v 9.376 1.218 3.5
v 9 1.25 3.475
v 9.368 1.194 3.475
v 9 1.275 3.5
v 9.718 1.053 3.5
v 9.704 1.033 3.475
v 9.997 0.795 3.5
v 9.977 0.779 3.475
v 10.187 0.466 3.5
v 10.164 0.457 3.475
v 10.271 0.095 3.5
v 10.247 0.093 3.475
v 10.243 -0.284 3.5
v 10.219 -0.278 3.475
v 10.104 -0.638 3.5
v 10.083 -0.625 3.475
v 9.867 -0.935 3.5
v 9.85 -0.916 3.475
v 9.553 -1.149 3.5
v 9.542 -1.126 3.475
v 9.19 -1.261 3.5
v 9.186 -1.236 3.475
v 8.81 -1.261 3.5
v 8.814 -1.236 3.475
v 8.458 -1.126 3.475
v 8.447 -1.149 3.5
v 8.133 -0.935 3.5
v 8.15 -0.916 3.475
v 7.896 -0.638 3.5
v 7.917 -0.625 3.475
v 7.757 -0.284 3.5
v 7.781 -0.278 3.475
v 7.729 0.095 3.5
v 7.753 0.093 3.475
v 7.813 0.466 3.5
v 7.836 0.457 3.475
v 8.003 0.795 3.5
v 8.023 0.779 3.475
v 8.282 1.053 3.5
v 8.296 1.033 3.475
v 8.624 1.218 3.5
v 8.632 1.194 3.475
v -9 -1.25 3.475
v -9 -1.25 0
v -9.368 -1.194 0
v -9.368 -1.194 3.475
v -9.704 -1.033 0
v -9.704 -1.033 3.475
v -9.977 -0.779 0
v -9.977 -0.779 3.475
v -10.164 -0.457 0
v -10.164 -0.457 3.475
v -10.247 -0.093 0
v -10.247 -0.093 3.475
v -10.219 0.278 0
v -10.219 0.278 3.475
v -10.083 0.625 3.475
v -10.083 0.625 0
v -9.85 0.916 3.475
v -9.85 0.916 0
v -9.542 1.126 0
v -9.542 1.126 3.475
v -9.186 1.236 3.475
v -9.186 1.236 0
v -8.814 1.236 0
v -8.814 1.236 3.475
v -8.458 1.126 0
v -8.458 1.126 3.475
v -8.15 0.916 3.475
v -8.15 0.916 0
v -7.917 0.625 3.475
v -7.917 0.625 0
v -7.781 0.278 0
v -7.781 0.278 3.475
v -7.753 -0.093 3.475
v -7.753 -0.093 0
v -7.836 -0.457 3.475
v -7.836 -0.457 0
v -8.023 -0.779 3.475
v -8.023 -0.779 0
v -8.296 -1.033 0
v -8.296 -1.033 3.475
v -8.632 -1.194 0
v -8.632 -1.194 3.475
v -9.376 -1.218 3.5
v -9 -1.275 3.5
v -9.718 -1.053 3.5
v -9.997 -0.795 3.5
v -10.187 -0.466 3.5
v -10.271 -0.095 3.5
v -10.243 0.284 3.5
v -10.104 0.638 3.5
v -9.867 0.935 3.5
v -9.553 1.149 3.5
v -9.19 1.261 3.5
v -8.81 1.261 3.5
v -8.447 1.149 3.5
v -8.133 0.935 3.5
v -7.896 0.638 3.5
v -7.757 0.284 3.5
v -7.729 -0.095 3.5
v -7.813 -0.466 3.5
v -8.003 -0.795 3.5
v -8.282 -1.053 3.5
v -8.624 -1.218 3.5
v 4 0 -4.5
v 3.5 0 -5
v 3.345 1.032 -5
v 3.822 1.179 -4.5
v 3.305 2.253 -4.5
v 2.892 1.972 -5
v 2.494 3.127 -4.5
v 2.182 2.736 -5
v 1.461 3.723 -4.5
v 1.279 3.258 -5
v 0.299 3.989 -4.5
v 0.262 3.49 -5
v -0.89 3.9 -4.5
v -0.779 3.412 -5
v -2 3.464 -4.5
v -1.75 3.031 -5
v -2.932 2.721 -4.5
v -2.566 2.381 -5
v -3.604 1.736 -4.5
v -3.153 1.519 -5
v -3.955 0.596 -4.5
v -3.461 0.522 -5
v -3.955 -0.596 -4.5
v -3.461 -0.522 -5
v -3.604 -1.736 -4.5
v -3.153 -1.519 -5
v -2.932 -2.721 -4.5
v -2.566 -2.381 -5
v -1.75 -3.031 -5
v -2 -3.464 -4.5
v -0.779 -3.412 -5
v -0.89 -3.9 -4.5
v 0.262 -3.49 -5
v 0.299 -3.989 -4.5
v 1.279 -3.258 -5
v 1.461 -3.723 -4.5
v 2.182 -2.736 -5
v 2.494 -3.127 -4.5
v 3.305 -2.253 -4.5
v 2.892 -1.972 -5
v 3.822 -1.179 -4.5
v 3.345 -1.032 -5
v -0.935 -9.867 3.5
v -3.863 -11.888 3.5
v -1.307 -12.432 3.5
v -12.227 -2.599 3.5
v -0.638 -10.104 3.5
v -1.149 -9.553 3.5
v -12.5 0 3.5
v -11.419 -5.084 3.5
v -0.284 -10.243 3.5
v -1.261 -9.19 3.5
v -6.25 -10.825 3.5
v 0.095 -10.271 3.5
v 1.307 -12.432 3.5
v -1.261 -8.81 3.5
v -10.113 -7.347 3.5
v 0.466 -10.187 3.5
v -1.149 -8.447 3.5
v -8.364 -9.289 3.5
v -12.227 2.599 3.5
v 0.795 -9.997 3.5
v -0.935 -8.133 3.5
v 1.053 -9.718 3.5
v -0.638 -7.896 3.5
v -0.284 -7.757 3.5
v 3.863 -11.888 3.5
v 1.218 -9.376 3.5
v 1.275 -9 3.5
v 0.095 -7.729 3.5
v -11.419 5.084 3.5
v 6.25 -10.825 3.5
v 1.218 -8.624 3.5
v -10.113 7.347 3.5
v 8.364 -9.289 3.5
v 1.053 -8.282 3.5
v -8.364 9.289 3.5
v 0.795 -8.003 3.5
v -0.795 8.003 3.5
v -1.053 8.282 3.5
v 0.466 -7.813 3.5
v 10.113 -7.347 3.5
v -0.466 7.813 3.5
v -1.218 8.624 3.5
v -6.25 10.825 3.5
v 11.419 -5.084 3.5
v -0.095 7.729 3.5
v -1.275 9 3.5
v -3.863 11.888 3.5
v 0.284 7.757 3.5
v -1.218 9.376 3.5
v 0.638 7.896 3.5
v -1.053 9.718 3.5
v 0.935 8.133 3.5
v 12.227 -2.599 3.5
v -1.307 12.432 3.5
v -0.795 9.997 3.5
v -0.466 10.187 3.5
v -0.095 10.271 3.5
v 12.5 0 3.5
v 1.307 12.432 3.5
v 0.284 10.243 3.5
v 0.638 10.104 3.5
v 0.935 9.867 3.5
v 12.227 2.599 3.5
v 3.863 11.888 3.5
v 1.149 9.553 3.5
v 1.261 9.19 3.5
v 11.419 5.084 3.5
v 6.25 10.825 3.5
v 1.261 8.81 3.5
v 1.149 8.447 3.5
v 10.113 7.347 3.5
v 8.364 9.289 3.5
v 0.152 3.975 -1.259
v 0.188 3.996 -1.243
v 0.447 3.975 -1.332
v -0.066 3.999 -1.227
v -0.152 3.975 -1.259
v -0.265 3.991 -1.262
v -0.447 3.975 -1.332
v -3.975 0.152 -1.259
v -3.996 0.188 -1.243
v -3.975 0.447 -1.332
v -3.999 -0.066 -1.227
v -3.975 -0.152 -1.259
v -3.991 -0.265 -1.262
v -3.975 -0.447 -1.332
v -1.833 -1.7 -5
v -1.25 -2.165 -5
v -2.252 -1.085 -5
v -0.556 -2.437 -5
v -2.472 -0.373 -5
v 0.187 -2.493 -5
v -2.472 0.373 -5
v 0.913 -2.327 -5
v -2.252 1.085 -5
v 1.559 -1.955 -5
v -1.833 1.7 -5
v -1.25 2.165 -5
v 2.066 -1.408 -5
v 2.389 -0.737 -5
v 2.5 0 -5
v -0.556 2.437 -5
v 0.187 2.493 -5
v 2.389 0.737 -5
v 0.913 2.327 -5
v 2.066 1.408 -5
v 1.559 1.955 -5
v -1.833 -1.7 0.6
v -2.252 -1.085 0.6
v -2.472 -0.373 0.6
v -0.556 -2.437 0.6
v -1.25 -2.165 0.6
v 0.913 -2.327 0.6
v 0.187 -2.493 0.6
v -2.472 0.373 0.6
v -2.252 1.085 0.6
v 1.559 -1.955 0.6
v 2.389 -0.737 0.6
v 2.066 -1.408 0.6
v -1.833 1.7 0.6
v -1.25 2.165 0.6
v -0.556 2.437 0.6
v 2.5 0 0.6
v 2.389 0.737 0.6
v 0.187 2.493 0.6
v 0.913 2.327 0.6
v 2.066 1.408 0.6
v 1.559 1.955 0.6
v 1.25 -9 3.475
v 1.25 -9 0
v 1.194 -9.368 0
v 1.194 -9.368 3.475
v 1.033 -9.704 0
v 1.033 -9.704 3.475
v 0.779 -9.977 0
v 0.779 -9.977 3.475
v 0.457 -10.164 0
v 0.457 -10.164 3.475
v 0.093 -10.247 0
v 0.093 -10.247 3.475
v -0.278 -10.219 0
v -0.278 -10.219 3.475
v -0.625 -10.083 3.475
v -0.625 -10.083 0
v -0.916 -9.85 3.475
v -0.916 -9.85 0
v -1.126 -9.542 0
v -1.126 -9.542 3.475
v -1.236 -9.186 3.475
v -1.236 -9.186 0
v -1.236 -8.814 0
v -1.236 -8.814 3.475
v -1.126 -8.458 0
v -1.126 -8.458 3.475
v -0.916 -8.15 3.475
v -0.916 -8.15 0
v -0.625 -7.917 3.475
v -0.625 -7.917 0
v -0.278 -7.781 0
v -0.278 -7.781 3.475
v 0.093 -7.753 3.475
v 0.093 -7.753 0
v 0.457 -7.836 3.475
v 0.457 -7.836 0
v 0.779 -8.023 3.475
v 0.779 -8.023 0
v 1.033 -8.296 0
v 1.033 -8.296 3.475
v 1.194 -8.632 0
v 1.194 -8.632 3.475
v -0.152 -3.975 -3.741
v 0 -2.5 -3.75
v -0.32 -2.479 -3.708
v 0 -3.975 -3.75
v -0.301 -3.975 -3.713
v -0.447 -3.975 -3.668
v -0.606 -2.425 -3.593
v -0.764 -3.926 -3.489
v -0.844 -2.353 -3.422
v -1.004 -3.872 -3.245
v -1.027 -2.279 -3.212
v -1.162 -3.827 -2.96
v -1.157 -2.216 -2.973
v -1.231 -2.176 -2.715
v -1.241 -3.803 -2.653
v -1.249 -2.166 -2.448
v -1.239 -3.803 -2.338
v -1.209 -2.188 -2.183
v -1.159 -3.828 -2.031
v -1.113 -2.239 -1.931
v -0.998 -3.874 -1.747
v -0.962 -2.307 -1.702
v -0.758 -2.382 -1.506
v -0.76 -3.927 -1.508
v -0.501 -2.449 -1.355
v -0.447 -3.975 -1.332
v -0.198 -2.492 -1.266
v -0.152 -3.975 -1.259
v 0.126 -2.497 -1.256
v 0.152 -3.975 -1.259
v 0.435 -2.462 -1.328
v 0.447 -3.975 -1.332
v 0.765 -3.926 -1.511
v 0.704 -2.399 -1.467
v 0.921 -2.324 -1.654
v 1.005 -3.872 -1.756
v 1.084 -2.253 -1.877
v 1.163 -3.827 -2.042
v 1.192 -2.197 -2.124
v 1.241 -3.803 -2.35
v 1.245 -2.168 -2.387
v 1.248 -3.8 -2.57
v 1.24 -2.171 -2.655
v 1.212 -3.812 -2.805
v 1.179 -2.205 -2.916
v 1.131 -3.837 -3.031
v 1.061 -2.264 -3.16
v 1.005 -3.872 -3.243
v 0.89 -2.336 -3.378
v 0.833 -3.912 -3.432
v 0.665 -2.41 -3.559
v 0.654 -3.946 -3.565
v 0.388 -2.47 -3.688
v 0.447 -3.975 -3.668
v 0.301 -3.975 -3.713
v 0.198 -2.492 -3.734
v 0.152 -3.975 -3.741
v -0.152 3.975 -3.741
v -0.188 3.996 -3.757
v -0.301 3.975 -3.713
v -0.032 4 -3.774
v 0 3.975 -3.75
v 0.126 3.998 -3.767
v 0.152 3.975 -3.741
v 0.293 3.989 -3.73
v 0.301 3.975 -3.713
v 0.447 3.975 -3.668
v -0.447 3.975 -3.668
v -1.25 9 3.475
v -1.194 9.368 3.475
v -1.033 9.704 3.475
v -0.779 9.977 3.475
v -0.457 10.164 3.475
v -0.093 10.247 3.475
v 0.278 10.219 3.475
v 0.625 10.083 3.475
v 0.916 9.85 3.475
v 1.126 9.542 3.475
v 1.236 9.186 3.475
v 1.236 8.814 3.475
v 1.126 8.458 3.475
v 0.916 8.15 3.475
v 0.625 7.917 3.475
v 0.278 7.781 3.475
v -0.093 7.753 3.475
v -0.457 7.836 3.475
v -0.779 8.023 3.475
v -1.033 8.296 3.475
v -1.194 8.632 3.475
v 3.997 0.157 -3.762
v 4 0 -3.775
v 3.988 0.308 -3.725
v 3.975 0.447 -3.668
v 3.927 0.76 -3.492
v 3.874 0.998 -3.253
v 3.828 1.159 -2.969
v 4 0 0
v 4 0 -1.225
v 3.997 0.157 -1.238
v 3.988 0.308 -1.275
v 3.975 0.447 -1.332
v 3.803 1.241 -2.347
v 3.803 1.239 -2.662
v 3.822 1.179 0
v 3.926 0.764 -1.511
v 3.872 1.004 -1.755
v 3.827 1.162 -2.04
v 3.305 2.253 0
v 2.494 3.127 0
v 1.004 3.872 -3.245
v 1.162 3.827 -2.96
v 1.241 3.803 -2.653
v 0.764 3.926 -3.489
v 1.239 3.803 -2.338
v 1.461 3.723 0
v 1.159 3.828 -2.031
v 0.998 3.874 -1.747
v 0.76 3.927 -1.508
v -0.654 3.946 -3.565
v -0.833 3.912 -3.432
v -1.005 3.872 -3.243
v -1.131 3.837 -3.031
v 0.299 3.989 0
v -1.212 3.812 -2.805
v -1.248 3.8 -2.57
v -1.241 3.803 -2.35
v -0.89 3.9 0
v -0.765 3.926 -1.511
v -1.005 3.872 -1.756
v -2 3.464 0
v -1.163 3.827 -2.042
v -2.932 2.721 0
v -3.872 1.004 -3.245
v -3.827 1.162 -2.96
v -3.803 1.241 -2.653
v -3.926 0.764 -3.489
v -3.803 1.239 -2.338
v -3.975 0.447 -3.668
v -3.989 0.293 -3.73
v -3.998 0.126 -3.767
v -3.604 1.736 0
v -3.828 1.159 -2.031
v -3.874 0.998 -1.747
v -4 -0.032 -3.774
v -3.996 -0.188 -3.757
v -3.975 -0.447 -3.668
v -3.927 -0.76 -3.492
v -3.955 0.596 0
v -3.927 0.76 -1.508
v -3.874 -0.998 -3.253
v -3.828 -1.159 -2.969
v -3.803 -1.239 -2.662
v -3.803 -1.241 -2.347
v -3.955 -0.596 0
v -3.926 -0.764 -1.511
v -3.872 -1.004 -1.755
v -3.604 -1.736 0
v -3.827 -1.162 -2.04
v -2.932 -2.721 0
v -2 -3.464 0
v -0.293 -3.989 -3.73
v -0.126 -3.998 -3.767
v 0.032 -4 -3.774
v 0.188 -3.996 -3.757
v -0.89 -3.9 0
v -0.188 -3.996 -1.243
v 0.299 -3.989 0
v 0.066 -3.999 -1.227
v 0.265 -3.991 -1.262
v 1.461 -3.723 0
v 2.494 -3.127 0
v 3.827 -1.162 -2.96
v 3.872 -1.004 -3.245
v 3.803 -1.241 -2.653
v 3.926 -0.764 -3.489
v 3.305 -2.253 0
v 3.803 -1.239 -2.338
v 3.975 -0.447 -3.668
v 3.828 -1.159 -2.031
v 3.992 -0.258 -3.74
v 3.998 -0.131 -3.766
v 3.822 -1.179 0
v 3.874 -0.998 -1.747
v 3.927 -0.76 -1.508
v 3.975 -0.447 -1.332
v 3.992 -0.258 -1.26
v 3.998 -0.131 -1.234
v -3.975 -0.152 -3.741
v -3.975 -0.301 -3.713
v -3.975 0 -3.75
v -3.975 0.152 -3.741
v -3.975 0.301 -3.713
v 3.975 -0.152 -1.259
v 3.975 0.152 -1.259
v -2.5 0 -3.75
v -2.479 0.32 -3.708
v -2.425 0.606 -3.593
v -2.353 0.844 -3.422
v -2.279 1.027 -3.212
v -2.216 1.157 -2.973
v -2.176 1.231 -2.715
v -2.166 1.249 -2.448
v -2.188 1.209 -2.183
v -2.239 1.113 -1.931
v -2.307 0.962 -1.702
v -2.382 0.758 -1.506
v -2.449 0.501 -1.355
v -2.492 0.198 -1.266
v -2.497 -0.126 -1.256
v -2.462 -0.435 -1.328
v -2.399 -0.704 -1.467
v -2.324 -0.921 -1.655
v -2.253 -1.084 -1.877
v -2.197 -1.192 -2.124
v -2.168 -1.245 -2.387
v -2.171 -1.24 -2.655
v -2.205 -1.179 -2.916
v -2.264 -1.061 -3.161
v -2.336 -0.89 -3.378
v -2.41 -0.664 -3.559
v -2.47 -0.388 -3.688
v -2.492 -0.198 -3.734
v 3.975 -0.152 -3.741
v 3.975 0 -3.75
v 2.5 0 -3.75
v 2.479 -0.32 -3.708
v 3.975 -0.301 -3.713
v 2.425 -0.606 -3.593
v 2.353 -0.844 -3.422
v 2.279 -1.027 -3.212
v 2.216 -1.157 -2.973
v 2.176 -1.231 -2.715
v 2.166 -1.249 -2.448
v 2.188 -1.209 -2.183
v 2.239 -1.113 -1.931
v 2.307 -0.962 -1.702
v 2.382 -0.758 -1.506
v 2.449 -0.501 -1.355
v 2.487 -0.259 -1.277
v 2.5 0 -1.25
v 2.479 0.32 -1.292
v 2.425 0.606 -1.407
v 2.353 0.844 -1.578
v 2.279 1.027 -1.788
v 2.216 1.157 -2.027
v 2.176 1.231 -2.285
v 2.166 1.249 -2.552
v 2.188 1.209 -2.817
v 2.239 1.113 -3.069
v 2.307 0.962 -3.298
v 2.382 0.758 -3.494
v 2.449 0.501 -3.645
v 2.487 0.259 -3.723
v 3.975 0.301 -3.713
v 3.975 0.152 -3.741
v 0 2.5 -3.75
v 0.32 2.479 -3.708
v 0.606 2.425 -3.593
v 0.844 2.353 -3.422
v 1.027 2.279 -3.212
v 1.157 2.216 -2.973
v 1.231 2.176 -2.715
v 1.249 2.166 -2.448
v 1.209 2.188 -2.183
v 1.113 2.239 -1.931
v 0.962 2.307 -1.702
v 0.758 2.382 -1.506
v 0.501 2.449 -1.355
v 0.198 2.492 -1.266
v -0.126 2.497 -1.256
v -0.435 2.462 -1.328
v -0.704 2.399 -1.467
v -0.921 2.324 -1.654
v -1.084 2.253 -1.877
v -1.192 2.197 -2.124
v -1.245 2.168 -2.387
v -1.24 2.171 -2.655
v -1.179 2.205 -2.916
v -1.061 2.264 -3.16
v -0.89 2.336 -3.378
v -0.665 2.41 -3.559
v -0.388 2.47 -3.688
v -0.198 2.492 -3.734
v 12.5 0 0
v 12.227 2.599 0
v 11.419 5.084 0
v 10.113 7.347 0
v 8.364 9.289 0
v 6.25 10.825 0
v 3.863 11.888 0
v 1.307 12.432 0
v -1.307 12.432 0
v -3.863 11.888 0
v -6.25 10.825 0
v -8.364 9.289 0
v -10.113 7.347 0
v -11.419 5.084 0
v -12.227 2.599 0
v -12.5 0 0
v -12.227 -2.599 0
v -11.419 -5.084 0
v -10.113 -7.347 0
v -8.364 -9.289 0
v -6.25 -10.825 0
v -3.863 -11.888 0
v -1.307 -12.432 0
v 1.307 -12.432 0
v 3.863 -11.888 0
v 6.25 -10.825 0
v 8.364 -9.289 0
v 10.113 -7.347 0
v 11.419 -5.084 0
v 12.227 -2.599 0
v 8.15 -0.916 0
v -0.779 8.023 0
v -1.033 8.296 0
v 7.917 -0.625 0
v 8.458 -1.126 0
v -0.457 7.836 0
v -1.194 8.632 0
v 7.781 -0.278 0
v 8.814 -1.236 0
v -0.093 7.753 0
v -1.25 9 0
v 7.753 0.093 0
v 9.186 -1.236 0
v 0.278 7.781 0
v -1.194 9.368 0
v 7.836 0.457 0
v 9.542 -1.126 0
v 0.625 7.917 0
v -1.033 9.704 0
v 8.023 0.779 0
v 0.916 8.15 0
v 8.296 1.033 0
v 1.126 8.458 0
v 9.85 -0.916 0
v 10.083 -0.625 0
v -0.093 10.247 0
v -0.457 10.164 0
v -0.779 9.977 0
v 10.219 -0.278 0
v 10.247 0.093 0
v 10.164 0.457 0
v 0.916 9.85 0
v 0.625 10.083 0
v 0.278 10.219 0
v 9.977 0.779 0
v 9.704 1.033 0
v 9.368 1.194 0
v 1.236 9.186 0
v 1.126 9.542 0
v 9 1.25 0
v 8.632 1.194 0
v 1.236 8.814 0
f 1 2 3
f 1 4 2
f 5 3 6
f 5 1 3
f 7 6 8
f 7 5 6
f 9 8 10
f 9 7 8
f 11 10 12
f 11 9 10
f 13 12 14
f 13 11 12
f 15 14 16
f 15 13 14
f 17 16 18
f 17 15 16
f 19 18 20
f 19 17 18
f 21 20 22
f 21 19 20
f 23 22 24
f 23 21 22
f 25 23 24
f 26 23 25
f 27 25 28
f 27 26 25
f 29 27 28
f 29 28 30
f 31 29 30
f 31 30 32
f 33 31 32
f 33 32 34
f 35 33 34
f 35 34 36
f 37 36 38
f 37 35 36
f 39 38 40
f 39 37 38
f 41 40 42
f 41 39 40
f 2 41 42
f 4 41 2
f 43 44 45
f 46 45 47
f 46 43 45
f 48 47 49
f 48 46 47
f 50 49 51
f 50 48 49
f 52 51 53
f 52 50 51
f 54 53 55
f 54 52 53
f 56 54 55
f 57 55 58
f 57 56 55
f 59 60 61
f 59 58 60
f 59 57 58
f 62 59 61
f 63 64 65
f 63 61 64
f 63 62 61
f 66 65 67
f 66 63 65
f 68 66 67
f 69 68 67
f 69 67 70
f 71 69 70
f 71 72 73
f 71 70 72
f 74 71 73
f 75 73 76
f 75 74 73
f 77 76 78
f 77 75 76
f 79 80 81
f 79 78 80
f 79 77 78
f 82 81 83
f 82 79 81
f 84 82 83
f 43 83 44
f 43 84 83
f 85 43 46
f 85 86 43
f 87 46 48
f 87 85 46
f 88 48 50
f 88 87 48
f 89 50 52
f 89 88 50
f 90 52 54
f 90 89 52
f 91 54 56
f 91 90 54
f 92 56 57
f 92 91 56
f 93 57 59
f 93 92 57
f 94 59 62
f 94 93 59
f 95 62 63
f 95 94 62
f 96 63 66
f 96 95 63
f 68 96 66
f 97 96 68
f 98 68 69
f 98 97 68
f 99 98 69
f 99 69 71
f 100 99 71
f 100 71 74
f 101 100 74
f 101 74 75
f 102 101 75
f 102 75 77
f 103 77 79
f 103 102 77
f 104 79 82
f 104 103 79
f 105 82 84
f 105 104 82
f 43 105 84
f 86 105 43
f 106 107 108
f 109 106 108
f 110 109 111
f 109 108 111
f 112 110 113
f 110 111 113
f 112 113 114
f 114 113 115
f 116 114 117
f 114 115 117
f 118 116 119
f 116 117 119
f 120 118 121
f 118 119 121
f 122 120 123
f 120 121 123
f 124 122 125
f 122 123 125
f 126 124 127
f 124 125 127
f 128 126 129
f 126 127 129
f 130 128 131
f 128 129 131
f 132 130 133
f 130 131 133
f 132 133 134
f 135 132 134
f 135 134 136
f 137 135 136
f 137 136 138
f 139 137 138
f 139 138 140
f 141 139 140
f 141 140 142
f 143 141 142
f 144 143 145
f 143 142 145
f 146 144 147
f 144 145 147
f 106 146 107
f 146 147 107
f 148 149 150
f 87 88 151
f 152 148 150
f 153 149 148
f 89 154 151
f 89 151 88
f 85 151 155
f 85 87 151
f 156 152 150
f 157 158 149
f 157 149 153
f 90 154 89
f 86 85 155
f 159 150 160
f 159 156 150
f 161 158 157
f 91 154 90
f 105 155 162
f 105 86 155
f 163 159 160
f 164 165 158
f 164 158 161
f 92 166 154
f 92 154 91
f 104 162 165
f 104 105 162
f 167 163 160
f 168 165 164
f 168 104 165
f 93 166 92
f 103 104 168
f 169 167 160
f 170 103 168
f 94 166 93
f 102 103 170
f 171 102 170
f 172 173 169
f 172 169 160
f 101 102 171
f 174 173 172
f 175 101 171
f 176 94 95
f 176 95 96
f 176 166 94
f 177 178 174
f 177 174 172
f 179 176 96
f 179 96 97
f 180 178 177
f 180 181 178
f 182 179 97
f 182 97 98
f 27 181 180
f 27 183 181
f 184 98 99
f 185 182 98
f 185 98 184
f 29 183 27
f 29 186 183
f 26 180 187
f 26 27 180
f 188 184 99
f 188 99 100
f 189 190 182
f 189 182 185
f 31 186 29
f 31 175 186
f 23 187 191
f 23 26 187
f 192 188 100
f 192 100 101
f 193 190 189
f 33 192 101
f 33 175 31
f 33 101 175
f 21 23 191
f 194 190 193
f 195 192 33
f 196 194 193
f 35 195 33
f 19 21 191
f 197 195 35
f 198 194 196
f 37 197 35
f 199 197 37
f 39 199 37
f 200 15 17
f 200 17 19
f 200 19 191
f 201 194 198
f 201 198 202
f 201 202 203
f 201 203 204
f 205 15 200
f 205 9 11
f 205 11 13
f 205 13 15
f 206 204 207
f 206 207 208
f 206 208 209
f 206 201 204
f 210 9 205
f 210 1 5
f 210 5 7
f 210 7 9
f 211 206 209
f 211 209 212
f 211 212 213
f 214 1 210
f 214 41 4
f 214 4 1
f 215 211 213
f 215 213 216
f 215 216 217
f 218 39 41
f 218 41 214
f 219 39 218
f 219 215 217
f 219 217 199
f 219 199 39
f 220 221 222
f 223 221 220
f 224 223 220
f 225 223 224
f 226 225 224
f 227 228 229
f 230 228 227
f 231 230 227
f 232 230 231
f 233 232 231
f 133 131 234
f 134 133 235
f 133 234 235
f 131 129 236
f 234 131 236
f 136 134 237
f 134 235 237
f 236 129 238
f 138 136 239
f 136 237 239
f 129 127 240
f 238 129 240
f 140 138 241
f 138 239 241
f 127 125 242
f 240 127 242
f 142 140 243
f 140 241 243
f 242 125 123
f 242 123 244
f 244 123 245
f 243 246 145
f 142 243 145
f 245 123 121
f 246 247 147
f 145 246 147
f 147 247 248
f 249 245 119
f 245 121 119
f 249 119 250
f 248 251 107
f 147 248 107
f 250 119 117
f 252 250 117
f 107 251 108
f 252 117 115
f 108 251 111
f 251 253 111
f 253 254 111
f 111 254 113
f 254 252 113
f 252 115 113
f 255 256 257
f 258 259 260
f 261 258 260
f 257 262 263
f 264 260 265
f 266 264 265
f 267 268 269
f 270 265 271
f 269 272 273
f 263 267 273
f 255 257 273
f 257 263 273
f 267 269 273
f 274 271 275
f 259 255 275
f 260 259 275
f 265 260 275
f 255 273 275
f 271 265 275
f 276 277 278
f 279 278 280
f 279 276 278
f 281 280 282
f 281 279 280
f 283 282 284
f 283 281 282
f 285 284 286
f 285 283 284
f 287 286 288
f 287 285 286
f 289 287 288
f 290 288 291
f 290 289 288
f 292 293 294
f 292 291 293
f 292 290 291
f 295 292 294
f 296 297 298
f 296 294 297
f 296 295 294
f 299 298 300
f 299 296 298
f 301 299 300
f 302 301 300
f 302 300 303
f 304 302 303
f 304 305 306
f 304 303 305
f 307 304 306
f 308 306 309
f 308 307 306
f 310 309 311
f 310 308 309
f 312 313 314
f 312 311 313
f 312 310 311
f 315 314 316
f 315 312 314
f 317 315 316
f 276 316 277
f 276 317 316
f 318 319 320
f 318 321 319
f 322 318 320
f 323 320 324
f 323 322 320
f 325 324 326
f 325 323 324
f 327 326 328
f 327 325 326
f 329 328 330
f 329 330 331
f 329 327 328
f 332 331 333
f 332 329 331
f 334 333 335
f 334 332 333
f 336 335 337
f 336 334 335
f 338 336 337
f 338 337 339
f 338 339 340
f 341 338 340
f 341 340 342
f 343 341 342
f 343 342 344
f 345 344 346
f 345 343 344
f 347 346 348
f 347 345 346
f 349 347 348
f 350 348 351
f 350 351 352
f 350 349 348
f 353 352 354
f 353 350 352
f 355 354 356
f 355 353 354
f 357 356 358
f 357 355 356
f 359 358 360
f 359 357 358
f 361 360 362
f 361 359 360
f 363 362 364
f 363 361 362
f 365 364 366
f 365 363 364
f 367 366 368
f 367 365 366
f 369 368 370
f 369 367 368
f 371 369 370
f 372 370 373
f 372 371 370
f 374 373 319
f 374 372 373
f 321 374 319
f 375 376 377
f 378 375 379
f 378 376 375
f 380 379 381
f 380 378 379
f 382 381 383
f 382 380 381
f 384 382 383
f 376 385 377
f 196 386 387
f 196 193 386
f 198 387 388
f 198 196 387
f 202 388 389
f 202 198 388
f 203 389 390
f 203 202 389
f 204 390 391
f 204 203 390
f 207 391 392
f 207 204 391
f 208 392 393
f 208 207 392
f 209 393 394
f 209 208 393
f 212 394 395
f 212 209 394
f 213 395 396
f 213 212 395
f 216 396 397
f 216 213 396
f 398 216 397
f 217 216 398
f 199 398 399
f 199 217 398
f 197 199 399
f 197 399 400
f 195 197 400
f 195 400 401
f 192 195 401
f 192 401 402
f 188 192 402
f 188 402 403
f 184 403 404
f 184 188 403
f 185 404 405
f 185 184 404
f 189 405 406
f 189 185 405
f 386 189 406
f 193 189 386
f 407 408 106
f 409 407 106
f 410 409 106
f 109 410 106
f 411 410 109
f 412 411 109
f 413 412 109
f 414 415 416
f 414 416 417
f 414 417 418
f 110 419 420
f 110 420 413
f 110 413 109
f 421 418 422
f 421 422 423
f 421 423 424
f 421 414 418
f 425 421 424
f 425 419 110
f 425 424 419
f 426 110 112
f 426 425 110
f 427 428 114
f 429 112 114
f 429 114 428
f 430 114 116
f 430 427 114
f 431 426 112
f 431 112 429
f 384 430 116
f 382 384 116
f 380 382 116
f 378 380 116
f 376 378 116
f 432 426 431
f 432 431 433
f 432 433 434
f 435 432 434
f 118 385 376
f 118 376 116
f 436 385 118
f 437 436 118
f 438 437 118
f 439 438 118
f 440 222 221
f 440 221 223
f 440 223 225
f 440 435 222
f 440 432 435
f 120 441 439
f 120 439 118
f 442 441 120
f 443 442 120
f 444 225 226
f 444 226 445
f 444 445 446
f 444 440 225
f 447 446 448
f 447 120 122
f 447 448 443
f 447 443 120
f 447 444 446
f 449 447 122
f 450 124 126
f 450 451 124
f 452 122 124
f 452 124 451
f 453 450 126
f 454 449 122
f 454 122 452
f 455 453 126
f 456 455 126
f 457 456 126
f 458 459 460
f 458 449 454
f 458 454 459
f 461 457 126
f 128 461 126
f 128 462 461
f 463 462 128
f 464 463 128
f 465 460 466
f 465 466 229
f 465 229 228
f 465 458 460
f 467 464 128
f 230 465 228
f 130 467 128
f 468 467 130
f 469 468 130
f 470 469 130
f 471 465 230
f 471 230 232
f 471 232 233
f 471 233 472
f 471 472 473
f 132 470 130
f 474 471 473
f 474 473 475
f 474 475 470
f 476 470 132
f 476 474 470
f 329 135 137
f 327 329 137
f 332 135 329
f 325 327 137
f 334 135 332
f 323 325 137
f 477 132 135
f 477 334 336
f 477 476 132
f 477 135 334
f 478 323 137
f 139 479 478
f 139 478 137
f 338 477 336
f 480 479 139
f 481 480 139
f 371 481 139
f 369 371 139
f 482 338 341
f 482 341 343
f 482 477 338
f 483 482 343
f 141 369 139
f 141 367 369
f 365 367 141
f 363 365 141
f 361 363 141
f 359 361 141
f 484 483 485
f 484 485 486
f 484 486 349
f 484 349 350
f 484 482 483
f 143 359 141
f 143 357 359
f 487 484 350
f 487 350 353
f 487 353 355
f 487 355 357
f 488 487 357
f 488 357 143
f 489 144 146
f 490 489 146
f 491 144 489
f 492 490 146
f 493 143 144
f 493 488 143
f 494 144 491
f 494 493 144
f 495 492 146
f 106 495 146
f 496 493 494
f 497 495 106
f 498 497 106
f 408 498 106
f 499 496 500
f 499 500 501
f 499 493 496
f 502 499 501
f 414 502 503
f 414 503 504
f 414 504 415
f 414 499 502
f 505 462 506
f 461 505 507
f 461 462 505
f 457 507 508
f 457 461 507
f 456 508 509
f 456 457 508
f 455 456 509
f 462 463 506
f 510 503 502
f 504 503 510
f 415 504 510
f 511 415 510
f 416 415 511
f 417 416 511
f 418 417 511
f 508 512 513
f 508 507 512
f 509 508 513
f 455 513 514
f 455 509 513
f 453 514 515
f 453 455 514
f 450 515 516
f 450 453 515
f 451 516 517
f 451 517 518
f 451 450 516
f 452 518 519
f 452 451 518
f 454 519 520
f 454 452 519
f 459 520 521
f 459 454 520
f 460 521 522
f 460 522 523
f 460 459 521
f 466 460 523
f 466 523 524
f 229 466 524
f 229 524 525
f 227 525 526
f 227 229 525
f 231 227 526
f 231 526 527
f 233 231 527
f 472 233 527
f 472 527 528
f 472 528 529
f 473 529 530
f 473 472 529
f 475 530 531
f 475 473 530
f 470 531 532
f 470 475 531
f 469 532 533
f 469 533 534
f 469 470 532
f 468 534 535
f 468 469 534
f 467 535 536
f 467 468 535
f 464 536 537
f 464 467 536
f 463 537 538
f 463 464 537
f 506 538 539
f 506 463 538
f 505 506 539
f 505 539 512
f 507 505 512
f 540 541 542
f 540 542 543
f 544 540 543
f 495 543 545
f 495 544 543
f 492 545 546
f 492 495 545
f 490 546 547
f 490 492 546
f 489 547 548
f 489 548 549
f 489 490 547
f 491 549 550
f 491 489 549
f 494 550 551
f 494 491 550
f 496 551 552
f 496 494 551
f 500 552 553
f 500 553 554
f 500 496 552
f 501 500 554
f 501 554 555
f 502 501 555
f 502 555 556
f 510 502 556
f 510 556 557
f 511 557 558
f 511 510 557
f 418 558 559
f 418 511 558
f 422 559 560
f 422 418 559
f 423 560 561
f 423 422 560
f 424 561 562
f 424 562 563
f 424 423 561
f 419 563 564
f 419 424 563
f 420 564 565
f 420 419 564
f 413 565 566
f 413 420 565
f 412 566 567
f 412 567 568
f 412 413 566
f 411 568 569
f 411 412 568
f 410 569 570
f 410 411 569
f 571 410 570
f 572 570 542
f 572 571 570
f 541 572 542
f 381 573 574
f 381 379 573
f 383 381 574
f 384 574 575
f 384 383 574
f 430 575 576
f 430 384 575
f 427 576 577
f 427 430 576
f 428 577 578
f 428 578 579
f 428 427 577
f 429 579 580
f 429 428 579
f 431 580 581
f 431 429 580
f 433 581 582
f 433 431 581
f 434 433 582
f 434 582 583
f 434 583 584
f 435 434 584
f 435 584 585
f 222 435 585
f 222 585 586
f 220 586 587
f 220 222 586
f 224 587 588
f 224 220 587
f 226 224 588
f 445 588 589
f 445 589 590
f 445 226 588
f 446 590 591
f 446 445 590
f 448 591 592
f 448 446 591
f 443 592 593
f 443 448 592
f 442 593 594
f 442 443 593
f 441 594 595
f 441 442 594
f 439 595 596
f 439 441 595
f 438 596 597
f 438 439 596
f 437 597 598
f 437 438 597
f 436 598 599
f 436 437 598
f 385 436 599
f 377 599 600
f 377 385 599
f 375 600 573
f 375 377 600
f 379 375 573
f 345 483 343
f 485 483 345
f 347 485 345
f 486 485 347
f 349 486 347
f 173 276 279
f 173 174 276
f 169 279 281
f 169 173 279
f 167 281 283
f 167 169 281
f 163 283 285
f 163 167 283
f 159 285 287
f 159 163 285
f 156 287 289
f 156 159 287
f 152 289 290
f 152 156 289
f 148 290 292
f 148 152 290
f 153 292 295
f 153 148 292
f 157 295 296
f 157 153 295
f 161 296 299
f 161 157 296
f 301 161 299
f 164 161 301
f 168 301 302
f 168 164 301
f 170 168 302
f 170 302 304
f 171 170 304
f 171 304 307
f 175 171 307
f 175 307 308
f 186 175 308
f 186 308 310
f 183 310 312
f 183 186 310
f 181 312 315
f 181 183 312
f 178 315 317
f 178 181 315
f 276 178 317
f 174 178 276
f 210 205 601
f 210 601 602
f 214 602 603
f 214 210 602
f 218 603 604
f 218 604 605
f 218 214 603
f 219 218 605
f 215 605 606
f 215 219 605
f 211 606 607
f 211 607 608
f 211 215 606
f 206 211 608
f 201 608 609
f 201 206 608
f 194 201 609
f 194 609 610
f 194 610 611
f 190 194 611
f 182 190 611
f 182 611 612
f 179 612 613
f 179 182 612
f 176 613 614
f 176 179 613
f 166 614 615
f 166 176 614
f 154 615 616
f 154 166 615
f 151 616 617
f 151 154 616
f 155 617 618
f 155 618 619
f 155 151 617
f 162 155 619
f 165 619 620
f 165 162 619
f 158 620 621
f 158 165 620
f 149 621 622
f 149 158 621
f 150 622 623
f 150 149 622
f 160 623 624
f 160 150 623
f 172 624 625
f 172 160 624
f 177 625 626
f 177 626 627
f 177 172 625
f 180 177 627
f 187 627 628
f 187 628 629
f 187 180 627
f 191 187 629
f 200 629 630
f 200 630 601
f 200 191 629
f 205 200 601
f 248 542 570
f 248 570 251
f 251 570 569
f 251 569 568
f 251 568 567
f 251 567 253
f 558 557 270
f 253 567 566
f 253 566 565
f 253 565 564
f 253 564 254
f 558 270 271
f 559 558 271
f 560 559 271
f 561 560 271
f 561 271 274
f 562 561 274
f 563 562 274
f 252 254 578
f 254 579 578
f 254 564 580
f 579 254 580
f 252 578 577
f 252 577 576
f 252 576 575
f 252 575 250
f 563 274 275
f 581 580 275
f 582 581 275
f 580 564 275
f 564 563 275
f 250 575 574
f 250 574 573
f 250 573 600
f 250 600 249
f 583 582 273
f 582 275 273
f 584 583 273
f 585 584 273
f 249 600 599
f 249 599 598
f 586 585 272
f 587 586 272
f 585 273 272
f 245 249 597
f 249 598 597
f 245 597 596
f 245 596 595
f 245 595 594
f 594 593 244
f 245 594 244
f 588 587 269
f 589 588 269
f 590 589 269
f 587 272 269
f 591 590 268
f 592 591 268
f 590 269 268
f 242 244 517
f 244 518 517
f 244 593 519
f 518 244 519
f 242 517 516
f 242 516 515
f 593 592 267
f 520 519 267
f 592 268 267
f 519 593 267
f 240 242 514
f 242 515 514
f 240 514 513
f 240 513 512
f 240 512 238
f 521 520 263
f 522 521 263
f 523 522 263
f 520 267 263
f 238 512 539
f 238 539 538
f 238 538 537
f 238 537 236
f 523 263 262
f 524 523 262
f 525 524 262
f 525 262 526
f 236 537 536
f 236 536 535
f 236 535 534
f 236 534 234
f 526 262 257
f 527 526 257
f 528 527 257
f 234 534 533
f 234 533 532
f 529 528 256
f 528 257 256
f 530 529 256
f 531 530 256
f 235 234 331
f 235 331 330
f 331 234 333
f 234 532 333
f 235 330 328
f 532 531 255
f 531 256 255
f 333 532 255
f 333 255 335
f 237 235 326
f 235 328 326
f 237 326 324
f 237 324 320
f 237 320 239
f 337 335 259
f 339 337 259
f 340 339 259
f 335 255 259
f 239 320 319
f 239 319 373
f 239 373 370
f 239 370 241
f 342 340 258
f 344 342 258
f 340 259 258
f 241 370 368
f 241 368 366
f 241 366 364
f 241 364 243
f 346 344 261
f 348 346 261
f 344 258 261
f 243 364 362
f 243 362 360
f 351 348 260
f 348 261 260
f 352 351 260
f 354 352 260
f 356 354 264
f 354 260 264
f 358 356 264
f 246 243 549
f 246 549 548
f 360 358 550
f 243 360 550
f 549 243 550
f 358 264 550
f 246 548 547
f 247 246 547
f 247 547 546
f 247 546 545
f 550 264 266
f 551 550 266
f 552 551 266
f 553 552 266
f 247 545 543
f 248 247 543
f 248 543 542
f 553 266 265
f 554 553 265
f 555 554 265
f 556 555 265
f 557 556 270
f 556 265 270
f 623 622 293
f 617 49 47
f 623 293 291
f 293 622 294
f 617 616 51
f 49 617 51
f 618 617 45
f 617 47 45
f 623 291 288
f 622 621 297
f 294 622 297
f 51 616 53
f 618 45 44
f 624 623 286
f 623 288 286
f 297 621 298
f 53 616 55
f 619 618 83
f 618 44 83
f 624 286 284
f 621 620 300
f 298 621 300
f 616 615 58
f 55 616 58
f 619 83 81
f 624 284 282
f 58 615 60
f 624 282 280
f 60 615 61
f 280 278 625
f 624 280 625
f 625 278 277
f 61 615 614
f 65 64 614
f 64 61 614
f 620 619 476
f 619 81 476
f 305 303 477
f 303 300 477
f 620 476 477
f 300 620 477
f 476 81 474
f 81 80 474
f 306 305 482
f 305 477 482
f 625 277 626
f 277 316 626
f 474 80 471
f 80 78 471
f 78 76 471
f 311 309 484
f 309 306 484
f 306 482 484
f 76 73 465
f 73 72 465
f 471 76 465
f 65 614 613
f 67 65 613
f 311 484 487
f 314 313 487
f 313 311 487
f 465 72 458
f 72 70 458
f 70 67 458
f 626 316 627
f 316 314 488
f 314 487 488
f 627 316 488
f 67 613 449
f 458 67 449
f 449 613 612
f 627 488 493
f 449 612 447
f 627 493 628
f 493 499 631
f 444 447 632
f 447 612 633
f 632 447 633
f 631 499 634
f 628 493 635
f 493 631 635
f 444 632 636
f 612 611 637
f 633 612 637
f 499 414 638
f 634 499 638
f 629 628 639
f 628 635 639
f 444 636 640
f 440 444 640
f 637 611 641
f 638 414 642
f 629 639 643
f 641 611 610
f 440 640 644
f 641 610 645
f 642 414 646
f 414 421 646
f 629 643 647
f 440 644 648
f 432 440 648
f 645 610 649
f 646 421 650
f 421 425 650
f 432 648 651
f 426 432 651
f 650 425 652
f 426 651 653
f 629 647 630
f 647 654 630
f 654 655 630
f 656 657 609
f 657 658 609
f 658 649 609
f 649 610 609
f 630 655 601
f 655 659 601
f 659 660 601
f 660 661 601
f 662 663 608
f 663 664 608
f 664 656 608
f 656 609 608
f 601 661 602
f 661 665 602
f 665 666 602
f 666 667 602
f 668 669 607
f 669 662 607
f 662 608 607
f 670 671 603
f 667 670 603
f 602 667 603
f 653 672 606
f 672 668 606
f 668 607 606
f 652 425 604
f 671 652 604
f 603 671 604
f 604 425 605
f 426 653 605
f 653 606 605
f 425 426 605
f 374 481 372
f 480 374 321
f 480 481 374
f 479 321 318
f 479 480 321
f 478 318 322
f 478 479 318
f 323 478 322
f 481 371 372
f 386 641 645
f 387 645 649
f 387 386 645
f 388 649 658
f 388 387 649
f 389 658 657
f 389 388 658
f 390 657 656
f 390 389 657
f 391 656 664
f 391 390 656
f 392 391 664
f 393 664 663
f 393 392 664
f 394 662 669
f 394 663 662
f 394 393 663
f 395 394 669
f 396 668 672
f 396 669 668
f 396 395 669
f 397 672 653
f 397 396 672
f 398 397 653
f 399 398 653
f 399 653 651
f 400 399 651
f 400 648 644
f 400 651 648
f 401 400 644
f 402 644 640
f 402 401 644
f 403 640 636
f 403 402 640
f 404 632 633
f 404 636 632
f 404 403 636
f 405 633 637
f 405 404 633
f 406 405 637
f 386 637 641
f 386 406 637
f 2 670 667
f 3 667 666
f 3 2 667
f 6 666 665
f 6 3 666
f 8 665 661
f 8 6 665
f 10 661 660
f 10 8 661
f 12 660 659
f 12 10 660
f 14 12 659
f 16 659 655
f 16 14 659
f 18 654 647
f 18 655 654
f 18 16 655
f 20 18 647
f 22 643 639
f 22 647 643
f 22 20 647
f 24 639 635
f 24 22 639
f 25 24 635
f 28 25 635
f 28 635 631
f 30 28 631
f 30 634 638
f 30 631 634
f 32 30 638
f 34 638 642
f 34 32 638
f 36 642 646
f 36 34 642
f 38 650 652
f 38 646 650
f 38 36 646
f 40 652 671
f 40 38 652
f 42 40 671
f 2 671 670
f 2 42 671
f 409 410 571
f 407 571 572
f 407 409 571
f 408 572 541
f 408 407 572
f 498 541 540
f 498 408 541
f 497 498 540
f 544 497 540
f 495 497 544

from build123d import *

# Parameters (mm, degrees)
SKETCH1_R           = 4
SKETCH1_R_2         = 2.5
BOSS_EXTRUDE1_DEPTH = 5
BOSS_EXTRUDE2_START = 3.5
SKETCH2_R           = 12.5
SKETCH2_R_2         = 2.5
BOSS_EXTRUDE2_DEPTH = 3.5
CIRPATTERN1_COUNT   = 4
CIRPATTERN2_COUNT   = 4
CHAMFER1_SIZE       = 0.5
SKETCH9_R           = 2.5
BOSS_EXTRUDE3_DEPTH = 2.9


with BuildPart() as part:
    # Sketch1 → Boss-Extrude1 (new body)
    with BuildSketch(Plane.XY):
        Circle(SKETCH1_R)
        Circle(SKETCH1_R_2, mode=Mode.SUBTRACT)
    extrude(amount=-BOSS_EXTRUDE1_DEPTH)

    # Sketch2 → Boss-Extrude2 (add)
    with BuildSketch(Plane.XY.offset(BOSS_EXTRUDE2_START)):
        Circle(SKETCH2_R)
        Circle(SKETCH2_R_2, mode=Mode.SUBTRACT)
    extrude(amount=-BOSS_EXTRUDE2_DEPTH)

    # Sketch6 → Tap Drill for M3 Tap1 (revolve, cut)
    with BuildSketch(Plane(origin=(4, 0, -2.5), x_dir=(0, 0, -1), z_dir=(0, 1, 0))):
        Polygon((0, 0), (0, 5.751075774), (1.25, 5), (1.25, 0.025), (1.275, 0), align=None)
    tap_drill_for_m3_tap1 = revolve(axis=Axis((10.35, 0, -2.5), (-1, 0, 0)), mode=Mode.SUBTRACT)

    # Sketch8 → Tap Drill for M3 Tap2 (revolve, cut)
    with BuildSketch(Plane(origin=(-9, 0, 3.5), x_dir=(0, -1, 0), z_dir=(1, 0, 0))):
        Polygon((0, 0), (0, 5.751075774), (1.25, 5), (1.25, 0.025), (1.275, 0), align=None)
    tap_drill_for_m3_tap2 = revolve(axis=Axis((-9, 0, 9.85), (0, 0, -1)), mode=Mode.SUBTRACT)

    # CirPattern1: Tap Drill for M3 Tap2 ×4 about axis
    cirpattern1_axis = Axis((0, 0, 0), (0, 0, 1))
    for i in range(1, CIRPATTERN1_COUNT):
        add(tap_drill_for_m3_tap2.rotate(cirpattern1_axis, i * 360 / CIRPATTERN1_COUNT), mode=Mode.SUBTRACT)

    # CirPattern2: Tap Drill for M3 Tap1 ×4 about axis
    cirpattern2_axis = Axis((0, 0, 0), (0, 0, 1))
    for i in range(1, CIRPATTERN2_COUNT):
        add(tap_drill_for_m3_tap1.rotate(cirpattern2_axis, i * 360 / CIRPATTERN2_COUNT), mode=Mode.SUBTRACT)

    # Chamfer1
    chamfer1_edges = [part.edges().sort_by_distance(p)[0] for p in [
        (-4, 0, -5),
    ]]
    chamfer(chamfer1_edges, length=CHAMFER1_SIZE)

    # Sketch9 → Boss-Extrude3 (add)
    with BuildSketch(Plane.XY.offset(3.5)):
        Circle(SKETCH9_R)
    extrude(amount=-BOSS_EXTRUDE3_DEPTH)


solid = part.part
